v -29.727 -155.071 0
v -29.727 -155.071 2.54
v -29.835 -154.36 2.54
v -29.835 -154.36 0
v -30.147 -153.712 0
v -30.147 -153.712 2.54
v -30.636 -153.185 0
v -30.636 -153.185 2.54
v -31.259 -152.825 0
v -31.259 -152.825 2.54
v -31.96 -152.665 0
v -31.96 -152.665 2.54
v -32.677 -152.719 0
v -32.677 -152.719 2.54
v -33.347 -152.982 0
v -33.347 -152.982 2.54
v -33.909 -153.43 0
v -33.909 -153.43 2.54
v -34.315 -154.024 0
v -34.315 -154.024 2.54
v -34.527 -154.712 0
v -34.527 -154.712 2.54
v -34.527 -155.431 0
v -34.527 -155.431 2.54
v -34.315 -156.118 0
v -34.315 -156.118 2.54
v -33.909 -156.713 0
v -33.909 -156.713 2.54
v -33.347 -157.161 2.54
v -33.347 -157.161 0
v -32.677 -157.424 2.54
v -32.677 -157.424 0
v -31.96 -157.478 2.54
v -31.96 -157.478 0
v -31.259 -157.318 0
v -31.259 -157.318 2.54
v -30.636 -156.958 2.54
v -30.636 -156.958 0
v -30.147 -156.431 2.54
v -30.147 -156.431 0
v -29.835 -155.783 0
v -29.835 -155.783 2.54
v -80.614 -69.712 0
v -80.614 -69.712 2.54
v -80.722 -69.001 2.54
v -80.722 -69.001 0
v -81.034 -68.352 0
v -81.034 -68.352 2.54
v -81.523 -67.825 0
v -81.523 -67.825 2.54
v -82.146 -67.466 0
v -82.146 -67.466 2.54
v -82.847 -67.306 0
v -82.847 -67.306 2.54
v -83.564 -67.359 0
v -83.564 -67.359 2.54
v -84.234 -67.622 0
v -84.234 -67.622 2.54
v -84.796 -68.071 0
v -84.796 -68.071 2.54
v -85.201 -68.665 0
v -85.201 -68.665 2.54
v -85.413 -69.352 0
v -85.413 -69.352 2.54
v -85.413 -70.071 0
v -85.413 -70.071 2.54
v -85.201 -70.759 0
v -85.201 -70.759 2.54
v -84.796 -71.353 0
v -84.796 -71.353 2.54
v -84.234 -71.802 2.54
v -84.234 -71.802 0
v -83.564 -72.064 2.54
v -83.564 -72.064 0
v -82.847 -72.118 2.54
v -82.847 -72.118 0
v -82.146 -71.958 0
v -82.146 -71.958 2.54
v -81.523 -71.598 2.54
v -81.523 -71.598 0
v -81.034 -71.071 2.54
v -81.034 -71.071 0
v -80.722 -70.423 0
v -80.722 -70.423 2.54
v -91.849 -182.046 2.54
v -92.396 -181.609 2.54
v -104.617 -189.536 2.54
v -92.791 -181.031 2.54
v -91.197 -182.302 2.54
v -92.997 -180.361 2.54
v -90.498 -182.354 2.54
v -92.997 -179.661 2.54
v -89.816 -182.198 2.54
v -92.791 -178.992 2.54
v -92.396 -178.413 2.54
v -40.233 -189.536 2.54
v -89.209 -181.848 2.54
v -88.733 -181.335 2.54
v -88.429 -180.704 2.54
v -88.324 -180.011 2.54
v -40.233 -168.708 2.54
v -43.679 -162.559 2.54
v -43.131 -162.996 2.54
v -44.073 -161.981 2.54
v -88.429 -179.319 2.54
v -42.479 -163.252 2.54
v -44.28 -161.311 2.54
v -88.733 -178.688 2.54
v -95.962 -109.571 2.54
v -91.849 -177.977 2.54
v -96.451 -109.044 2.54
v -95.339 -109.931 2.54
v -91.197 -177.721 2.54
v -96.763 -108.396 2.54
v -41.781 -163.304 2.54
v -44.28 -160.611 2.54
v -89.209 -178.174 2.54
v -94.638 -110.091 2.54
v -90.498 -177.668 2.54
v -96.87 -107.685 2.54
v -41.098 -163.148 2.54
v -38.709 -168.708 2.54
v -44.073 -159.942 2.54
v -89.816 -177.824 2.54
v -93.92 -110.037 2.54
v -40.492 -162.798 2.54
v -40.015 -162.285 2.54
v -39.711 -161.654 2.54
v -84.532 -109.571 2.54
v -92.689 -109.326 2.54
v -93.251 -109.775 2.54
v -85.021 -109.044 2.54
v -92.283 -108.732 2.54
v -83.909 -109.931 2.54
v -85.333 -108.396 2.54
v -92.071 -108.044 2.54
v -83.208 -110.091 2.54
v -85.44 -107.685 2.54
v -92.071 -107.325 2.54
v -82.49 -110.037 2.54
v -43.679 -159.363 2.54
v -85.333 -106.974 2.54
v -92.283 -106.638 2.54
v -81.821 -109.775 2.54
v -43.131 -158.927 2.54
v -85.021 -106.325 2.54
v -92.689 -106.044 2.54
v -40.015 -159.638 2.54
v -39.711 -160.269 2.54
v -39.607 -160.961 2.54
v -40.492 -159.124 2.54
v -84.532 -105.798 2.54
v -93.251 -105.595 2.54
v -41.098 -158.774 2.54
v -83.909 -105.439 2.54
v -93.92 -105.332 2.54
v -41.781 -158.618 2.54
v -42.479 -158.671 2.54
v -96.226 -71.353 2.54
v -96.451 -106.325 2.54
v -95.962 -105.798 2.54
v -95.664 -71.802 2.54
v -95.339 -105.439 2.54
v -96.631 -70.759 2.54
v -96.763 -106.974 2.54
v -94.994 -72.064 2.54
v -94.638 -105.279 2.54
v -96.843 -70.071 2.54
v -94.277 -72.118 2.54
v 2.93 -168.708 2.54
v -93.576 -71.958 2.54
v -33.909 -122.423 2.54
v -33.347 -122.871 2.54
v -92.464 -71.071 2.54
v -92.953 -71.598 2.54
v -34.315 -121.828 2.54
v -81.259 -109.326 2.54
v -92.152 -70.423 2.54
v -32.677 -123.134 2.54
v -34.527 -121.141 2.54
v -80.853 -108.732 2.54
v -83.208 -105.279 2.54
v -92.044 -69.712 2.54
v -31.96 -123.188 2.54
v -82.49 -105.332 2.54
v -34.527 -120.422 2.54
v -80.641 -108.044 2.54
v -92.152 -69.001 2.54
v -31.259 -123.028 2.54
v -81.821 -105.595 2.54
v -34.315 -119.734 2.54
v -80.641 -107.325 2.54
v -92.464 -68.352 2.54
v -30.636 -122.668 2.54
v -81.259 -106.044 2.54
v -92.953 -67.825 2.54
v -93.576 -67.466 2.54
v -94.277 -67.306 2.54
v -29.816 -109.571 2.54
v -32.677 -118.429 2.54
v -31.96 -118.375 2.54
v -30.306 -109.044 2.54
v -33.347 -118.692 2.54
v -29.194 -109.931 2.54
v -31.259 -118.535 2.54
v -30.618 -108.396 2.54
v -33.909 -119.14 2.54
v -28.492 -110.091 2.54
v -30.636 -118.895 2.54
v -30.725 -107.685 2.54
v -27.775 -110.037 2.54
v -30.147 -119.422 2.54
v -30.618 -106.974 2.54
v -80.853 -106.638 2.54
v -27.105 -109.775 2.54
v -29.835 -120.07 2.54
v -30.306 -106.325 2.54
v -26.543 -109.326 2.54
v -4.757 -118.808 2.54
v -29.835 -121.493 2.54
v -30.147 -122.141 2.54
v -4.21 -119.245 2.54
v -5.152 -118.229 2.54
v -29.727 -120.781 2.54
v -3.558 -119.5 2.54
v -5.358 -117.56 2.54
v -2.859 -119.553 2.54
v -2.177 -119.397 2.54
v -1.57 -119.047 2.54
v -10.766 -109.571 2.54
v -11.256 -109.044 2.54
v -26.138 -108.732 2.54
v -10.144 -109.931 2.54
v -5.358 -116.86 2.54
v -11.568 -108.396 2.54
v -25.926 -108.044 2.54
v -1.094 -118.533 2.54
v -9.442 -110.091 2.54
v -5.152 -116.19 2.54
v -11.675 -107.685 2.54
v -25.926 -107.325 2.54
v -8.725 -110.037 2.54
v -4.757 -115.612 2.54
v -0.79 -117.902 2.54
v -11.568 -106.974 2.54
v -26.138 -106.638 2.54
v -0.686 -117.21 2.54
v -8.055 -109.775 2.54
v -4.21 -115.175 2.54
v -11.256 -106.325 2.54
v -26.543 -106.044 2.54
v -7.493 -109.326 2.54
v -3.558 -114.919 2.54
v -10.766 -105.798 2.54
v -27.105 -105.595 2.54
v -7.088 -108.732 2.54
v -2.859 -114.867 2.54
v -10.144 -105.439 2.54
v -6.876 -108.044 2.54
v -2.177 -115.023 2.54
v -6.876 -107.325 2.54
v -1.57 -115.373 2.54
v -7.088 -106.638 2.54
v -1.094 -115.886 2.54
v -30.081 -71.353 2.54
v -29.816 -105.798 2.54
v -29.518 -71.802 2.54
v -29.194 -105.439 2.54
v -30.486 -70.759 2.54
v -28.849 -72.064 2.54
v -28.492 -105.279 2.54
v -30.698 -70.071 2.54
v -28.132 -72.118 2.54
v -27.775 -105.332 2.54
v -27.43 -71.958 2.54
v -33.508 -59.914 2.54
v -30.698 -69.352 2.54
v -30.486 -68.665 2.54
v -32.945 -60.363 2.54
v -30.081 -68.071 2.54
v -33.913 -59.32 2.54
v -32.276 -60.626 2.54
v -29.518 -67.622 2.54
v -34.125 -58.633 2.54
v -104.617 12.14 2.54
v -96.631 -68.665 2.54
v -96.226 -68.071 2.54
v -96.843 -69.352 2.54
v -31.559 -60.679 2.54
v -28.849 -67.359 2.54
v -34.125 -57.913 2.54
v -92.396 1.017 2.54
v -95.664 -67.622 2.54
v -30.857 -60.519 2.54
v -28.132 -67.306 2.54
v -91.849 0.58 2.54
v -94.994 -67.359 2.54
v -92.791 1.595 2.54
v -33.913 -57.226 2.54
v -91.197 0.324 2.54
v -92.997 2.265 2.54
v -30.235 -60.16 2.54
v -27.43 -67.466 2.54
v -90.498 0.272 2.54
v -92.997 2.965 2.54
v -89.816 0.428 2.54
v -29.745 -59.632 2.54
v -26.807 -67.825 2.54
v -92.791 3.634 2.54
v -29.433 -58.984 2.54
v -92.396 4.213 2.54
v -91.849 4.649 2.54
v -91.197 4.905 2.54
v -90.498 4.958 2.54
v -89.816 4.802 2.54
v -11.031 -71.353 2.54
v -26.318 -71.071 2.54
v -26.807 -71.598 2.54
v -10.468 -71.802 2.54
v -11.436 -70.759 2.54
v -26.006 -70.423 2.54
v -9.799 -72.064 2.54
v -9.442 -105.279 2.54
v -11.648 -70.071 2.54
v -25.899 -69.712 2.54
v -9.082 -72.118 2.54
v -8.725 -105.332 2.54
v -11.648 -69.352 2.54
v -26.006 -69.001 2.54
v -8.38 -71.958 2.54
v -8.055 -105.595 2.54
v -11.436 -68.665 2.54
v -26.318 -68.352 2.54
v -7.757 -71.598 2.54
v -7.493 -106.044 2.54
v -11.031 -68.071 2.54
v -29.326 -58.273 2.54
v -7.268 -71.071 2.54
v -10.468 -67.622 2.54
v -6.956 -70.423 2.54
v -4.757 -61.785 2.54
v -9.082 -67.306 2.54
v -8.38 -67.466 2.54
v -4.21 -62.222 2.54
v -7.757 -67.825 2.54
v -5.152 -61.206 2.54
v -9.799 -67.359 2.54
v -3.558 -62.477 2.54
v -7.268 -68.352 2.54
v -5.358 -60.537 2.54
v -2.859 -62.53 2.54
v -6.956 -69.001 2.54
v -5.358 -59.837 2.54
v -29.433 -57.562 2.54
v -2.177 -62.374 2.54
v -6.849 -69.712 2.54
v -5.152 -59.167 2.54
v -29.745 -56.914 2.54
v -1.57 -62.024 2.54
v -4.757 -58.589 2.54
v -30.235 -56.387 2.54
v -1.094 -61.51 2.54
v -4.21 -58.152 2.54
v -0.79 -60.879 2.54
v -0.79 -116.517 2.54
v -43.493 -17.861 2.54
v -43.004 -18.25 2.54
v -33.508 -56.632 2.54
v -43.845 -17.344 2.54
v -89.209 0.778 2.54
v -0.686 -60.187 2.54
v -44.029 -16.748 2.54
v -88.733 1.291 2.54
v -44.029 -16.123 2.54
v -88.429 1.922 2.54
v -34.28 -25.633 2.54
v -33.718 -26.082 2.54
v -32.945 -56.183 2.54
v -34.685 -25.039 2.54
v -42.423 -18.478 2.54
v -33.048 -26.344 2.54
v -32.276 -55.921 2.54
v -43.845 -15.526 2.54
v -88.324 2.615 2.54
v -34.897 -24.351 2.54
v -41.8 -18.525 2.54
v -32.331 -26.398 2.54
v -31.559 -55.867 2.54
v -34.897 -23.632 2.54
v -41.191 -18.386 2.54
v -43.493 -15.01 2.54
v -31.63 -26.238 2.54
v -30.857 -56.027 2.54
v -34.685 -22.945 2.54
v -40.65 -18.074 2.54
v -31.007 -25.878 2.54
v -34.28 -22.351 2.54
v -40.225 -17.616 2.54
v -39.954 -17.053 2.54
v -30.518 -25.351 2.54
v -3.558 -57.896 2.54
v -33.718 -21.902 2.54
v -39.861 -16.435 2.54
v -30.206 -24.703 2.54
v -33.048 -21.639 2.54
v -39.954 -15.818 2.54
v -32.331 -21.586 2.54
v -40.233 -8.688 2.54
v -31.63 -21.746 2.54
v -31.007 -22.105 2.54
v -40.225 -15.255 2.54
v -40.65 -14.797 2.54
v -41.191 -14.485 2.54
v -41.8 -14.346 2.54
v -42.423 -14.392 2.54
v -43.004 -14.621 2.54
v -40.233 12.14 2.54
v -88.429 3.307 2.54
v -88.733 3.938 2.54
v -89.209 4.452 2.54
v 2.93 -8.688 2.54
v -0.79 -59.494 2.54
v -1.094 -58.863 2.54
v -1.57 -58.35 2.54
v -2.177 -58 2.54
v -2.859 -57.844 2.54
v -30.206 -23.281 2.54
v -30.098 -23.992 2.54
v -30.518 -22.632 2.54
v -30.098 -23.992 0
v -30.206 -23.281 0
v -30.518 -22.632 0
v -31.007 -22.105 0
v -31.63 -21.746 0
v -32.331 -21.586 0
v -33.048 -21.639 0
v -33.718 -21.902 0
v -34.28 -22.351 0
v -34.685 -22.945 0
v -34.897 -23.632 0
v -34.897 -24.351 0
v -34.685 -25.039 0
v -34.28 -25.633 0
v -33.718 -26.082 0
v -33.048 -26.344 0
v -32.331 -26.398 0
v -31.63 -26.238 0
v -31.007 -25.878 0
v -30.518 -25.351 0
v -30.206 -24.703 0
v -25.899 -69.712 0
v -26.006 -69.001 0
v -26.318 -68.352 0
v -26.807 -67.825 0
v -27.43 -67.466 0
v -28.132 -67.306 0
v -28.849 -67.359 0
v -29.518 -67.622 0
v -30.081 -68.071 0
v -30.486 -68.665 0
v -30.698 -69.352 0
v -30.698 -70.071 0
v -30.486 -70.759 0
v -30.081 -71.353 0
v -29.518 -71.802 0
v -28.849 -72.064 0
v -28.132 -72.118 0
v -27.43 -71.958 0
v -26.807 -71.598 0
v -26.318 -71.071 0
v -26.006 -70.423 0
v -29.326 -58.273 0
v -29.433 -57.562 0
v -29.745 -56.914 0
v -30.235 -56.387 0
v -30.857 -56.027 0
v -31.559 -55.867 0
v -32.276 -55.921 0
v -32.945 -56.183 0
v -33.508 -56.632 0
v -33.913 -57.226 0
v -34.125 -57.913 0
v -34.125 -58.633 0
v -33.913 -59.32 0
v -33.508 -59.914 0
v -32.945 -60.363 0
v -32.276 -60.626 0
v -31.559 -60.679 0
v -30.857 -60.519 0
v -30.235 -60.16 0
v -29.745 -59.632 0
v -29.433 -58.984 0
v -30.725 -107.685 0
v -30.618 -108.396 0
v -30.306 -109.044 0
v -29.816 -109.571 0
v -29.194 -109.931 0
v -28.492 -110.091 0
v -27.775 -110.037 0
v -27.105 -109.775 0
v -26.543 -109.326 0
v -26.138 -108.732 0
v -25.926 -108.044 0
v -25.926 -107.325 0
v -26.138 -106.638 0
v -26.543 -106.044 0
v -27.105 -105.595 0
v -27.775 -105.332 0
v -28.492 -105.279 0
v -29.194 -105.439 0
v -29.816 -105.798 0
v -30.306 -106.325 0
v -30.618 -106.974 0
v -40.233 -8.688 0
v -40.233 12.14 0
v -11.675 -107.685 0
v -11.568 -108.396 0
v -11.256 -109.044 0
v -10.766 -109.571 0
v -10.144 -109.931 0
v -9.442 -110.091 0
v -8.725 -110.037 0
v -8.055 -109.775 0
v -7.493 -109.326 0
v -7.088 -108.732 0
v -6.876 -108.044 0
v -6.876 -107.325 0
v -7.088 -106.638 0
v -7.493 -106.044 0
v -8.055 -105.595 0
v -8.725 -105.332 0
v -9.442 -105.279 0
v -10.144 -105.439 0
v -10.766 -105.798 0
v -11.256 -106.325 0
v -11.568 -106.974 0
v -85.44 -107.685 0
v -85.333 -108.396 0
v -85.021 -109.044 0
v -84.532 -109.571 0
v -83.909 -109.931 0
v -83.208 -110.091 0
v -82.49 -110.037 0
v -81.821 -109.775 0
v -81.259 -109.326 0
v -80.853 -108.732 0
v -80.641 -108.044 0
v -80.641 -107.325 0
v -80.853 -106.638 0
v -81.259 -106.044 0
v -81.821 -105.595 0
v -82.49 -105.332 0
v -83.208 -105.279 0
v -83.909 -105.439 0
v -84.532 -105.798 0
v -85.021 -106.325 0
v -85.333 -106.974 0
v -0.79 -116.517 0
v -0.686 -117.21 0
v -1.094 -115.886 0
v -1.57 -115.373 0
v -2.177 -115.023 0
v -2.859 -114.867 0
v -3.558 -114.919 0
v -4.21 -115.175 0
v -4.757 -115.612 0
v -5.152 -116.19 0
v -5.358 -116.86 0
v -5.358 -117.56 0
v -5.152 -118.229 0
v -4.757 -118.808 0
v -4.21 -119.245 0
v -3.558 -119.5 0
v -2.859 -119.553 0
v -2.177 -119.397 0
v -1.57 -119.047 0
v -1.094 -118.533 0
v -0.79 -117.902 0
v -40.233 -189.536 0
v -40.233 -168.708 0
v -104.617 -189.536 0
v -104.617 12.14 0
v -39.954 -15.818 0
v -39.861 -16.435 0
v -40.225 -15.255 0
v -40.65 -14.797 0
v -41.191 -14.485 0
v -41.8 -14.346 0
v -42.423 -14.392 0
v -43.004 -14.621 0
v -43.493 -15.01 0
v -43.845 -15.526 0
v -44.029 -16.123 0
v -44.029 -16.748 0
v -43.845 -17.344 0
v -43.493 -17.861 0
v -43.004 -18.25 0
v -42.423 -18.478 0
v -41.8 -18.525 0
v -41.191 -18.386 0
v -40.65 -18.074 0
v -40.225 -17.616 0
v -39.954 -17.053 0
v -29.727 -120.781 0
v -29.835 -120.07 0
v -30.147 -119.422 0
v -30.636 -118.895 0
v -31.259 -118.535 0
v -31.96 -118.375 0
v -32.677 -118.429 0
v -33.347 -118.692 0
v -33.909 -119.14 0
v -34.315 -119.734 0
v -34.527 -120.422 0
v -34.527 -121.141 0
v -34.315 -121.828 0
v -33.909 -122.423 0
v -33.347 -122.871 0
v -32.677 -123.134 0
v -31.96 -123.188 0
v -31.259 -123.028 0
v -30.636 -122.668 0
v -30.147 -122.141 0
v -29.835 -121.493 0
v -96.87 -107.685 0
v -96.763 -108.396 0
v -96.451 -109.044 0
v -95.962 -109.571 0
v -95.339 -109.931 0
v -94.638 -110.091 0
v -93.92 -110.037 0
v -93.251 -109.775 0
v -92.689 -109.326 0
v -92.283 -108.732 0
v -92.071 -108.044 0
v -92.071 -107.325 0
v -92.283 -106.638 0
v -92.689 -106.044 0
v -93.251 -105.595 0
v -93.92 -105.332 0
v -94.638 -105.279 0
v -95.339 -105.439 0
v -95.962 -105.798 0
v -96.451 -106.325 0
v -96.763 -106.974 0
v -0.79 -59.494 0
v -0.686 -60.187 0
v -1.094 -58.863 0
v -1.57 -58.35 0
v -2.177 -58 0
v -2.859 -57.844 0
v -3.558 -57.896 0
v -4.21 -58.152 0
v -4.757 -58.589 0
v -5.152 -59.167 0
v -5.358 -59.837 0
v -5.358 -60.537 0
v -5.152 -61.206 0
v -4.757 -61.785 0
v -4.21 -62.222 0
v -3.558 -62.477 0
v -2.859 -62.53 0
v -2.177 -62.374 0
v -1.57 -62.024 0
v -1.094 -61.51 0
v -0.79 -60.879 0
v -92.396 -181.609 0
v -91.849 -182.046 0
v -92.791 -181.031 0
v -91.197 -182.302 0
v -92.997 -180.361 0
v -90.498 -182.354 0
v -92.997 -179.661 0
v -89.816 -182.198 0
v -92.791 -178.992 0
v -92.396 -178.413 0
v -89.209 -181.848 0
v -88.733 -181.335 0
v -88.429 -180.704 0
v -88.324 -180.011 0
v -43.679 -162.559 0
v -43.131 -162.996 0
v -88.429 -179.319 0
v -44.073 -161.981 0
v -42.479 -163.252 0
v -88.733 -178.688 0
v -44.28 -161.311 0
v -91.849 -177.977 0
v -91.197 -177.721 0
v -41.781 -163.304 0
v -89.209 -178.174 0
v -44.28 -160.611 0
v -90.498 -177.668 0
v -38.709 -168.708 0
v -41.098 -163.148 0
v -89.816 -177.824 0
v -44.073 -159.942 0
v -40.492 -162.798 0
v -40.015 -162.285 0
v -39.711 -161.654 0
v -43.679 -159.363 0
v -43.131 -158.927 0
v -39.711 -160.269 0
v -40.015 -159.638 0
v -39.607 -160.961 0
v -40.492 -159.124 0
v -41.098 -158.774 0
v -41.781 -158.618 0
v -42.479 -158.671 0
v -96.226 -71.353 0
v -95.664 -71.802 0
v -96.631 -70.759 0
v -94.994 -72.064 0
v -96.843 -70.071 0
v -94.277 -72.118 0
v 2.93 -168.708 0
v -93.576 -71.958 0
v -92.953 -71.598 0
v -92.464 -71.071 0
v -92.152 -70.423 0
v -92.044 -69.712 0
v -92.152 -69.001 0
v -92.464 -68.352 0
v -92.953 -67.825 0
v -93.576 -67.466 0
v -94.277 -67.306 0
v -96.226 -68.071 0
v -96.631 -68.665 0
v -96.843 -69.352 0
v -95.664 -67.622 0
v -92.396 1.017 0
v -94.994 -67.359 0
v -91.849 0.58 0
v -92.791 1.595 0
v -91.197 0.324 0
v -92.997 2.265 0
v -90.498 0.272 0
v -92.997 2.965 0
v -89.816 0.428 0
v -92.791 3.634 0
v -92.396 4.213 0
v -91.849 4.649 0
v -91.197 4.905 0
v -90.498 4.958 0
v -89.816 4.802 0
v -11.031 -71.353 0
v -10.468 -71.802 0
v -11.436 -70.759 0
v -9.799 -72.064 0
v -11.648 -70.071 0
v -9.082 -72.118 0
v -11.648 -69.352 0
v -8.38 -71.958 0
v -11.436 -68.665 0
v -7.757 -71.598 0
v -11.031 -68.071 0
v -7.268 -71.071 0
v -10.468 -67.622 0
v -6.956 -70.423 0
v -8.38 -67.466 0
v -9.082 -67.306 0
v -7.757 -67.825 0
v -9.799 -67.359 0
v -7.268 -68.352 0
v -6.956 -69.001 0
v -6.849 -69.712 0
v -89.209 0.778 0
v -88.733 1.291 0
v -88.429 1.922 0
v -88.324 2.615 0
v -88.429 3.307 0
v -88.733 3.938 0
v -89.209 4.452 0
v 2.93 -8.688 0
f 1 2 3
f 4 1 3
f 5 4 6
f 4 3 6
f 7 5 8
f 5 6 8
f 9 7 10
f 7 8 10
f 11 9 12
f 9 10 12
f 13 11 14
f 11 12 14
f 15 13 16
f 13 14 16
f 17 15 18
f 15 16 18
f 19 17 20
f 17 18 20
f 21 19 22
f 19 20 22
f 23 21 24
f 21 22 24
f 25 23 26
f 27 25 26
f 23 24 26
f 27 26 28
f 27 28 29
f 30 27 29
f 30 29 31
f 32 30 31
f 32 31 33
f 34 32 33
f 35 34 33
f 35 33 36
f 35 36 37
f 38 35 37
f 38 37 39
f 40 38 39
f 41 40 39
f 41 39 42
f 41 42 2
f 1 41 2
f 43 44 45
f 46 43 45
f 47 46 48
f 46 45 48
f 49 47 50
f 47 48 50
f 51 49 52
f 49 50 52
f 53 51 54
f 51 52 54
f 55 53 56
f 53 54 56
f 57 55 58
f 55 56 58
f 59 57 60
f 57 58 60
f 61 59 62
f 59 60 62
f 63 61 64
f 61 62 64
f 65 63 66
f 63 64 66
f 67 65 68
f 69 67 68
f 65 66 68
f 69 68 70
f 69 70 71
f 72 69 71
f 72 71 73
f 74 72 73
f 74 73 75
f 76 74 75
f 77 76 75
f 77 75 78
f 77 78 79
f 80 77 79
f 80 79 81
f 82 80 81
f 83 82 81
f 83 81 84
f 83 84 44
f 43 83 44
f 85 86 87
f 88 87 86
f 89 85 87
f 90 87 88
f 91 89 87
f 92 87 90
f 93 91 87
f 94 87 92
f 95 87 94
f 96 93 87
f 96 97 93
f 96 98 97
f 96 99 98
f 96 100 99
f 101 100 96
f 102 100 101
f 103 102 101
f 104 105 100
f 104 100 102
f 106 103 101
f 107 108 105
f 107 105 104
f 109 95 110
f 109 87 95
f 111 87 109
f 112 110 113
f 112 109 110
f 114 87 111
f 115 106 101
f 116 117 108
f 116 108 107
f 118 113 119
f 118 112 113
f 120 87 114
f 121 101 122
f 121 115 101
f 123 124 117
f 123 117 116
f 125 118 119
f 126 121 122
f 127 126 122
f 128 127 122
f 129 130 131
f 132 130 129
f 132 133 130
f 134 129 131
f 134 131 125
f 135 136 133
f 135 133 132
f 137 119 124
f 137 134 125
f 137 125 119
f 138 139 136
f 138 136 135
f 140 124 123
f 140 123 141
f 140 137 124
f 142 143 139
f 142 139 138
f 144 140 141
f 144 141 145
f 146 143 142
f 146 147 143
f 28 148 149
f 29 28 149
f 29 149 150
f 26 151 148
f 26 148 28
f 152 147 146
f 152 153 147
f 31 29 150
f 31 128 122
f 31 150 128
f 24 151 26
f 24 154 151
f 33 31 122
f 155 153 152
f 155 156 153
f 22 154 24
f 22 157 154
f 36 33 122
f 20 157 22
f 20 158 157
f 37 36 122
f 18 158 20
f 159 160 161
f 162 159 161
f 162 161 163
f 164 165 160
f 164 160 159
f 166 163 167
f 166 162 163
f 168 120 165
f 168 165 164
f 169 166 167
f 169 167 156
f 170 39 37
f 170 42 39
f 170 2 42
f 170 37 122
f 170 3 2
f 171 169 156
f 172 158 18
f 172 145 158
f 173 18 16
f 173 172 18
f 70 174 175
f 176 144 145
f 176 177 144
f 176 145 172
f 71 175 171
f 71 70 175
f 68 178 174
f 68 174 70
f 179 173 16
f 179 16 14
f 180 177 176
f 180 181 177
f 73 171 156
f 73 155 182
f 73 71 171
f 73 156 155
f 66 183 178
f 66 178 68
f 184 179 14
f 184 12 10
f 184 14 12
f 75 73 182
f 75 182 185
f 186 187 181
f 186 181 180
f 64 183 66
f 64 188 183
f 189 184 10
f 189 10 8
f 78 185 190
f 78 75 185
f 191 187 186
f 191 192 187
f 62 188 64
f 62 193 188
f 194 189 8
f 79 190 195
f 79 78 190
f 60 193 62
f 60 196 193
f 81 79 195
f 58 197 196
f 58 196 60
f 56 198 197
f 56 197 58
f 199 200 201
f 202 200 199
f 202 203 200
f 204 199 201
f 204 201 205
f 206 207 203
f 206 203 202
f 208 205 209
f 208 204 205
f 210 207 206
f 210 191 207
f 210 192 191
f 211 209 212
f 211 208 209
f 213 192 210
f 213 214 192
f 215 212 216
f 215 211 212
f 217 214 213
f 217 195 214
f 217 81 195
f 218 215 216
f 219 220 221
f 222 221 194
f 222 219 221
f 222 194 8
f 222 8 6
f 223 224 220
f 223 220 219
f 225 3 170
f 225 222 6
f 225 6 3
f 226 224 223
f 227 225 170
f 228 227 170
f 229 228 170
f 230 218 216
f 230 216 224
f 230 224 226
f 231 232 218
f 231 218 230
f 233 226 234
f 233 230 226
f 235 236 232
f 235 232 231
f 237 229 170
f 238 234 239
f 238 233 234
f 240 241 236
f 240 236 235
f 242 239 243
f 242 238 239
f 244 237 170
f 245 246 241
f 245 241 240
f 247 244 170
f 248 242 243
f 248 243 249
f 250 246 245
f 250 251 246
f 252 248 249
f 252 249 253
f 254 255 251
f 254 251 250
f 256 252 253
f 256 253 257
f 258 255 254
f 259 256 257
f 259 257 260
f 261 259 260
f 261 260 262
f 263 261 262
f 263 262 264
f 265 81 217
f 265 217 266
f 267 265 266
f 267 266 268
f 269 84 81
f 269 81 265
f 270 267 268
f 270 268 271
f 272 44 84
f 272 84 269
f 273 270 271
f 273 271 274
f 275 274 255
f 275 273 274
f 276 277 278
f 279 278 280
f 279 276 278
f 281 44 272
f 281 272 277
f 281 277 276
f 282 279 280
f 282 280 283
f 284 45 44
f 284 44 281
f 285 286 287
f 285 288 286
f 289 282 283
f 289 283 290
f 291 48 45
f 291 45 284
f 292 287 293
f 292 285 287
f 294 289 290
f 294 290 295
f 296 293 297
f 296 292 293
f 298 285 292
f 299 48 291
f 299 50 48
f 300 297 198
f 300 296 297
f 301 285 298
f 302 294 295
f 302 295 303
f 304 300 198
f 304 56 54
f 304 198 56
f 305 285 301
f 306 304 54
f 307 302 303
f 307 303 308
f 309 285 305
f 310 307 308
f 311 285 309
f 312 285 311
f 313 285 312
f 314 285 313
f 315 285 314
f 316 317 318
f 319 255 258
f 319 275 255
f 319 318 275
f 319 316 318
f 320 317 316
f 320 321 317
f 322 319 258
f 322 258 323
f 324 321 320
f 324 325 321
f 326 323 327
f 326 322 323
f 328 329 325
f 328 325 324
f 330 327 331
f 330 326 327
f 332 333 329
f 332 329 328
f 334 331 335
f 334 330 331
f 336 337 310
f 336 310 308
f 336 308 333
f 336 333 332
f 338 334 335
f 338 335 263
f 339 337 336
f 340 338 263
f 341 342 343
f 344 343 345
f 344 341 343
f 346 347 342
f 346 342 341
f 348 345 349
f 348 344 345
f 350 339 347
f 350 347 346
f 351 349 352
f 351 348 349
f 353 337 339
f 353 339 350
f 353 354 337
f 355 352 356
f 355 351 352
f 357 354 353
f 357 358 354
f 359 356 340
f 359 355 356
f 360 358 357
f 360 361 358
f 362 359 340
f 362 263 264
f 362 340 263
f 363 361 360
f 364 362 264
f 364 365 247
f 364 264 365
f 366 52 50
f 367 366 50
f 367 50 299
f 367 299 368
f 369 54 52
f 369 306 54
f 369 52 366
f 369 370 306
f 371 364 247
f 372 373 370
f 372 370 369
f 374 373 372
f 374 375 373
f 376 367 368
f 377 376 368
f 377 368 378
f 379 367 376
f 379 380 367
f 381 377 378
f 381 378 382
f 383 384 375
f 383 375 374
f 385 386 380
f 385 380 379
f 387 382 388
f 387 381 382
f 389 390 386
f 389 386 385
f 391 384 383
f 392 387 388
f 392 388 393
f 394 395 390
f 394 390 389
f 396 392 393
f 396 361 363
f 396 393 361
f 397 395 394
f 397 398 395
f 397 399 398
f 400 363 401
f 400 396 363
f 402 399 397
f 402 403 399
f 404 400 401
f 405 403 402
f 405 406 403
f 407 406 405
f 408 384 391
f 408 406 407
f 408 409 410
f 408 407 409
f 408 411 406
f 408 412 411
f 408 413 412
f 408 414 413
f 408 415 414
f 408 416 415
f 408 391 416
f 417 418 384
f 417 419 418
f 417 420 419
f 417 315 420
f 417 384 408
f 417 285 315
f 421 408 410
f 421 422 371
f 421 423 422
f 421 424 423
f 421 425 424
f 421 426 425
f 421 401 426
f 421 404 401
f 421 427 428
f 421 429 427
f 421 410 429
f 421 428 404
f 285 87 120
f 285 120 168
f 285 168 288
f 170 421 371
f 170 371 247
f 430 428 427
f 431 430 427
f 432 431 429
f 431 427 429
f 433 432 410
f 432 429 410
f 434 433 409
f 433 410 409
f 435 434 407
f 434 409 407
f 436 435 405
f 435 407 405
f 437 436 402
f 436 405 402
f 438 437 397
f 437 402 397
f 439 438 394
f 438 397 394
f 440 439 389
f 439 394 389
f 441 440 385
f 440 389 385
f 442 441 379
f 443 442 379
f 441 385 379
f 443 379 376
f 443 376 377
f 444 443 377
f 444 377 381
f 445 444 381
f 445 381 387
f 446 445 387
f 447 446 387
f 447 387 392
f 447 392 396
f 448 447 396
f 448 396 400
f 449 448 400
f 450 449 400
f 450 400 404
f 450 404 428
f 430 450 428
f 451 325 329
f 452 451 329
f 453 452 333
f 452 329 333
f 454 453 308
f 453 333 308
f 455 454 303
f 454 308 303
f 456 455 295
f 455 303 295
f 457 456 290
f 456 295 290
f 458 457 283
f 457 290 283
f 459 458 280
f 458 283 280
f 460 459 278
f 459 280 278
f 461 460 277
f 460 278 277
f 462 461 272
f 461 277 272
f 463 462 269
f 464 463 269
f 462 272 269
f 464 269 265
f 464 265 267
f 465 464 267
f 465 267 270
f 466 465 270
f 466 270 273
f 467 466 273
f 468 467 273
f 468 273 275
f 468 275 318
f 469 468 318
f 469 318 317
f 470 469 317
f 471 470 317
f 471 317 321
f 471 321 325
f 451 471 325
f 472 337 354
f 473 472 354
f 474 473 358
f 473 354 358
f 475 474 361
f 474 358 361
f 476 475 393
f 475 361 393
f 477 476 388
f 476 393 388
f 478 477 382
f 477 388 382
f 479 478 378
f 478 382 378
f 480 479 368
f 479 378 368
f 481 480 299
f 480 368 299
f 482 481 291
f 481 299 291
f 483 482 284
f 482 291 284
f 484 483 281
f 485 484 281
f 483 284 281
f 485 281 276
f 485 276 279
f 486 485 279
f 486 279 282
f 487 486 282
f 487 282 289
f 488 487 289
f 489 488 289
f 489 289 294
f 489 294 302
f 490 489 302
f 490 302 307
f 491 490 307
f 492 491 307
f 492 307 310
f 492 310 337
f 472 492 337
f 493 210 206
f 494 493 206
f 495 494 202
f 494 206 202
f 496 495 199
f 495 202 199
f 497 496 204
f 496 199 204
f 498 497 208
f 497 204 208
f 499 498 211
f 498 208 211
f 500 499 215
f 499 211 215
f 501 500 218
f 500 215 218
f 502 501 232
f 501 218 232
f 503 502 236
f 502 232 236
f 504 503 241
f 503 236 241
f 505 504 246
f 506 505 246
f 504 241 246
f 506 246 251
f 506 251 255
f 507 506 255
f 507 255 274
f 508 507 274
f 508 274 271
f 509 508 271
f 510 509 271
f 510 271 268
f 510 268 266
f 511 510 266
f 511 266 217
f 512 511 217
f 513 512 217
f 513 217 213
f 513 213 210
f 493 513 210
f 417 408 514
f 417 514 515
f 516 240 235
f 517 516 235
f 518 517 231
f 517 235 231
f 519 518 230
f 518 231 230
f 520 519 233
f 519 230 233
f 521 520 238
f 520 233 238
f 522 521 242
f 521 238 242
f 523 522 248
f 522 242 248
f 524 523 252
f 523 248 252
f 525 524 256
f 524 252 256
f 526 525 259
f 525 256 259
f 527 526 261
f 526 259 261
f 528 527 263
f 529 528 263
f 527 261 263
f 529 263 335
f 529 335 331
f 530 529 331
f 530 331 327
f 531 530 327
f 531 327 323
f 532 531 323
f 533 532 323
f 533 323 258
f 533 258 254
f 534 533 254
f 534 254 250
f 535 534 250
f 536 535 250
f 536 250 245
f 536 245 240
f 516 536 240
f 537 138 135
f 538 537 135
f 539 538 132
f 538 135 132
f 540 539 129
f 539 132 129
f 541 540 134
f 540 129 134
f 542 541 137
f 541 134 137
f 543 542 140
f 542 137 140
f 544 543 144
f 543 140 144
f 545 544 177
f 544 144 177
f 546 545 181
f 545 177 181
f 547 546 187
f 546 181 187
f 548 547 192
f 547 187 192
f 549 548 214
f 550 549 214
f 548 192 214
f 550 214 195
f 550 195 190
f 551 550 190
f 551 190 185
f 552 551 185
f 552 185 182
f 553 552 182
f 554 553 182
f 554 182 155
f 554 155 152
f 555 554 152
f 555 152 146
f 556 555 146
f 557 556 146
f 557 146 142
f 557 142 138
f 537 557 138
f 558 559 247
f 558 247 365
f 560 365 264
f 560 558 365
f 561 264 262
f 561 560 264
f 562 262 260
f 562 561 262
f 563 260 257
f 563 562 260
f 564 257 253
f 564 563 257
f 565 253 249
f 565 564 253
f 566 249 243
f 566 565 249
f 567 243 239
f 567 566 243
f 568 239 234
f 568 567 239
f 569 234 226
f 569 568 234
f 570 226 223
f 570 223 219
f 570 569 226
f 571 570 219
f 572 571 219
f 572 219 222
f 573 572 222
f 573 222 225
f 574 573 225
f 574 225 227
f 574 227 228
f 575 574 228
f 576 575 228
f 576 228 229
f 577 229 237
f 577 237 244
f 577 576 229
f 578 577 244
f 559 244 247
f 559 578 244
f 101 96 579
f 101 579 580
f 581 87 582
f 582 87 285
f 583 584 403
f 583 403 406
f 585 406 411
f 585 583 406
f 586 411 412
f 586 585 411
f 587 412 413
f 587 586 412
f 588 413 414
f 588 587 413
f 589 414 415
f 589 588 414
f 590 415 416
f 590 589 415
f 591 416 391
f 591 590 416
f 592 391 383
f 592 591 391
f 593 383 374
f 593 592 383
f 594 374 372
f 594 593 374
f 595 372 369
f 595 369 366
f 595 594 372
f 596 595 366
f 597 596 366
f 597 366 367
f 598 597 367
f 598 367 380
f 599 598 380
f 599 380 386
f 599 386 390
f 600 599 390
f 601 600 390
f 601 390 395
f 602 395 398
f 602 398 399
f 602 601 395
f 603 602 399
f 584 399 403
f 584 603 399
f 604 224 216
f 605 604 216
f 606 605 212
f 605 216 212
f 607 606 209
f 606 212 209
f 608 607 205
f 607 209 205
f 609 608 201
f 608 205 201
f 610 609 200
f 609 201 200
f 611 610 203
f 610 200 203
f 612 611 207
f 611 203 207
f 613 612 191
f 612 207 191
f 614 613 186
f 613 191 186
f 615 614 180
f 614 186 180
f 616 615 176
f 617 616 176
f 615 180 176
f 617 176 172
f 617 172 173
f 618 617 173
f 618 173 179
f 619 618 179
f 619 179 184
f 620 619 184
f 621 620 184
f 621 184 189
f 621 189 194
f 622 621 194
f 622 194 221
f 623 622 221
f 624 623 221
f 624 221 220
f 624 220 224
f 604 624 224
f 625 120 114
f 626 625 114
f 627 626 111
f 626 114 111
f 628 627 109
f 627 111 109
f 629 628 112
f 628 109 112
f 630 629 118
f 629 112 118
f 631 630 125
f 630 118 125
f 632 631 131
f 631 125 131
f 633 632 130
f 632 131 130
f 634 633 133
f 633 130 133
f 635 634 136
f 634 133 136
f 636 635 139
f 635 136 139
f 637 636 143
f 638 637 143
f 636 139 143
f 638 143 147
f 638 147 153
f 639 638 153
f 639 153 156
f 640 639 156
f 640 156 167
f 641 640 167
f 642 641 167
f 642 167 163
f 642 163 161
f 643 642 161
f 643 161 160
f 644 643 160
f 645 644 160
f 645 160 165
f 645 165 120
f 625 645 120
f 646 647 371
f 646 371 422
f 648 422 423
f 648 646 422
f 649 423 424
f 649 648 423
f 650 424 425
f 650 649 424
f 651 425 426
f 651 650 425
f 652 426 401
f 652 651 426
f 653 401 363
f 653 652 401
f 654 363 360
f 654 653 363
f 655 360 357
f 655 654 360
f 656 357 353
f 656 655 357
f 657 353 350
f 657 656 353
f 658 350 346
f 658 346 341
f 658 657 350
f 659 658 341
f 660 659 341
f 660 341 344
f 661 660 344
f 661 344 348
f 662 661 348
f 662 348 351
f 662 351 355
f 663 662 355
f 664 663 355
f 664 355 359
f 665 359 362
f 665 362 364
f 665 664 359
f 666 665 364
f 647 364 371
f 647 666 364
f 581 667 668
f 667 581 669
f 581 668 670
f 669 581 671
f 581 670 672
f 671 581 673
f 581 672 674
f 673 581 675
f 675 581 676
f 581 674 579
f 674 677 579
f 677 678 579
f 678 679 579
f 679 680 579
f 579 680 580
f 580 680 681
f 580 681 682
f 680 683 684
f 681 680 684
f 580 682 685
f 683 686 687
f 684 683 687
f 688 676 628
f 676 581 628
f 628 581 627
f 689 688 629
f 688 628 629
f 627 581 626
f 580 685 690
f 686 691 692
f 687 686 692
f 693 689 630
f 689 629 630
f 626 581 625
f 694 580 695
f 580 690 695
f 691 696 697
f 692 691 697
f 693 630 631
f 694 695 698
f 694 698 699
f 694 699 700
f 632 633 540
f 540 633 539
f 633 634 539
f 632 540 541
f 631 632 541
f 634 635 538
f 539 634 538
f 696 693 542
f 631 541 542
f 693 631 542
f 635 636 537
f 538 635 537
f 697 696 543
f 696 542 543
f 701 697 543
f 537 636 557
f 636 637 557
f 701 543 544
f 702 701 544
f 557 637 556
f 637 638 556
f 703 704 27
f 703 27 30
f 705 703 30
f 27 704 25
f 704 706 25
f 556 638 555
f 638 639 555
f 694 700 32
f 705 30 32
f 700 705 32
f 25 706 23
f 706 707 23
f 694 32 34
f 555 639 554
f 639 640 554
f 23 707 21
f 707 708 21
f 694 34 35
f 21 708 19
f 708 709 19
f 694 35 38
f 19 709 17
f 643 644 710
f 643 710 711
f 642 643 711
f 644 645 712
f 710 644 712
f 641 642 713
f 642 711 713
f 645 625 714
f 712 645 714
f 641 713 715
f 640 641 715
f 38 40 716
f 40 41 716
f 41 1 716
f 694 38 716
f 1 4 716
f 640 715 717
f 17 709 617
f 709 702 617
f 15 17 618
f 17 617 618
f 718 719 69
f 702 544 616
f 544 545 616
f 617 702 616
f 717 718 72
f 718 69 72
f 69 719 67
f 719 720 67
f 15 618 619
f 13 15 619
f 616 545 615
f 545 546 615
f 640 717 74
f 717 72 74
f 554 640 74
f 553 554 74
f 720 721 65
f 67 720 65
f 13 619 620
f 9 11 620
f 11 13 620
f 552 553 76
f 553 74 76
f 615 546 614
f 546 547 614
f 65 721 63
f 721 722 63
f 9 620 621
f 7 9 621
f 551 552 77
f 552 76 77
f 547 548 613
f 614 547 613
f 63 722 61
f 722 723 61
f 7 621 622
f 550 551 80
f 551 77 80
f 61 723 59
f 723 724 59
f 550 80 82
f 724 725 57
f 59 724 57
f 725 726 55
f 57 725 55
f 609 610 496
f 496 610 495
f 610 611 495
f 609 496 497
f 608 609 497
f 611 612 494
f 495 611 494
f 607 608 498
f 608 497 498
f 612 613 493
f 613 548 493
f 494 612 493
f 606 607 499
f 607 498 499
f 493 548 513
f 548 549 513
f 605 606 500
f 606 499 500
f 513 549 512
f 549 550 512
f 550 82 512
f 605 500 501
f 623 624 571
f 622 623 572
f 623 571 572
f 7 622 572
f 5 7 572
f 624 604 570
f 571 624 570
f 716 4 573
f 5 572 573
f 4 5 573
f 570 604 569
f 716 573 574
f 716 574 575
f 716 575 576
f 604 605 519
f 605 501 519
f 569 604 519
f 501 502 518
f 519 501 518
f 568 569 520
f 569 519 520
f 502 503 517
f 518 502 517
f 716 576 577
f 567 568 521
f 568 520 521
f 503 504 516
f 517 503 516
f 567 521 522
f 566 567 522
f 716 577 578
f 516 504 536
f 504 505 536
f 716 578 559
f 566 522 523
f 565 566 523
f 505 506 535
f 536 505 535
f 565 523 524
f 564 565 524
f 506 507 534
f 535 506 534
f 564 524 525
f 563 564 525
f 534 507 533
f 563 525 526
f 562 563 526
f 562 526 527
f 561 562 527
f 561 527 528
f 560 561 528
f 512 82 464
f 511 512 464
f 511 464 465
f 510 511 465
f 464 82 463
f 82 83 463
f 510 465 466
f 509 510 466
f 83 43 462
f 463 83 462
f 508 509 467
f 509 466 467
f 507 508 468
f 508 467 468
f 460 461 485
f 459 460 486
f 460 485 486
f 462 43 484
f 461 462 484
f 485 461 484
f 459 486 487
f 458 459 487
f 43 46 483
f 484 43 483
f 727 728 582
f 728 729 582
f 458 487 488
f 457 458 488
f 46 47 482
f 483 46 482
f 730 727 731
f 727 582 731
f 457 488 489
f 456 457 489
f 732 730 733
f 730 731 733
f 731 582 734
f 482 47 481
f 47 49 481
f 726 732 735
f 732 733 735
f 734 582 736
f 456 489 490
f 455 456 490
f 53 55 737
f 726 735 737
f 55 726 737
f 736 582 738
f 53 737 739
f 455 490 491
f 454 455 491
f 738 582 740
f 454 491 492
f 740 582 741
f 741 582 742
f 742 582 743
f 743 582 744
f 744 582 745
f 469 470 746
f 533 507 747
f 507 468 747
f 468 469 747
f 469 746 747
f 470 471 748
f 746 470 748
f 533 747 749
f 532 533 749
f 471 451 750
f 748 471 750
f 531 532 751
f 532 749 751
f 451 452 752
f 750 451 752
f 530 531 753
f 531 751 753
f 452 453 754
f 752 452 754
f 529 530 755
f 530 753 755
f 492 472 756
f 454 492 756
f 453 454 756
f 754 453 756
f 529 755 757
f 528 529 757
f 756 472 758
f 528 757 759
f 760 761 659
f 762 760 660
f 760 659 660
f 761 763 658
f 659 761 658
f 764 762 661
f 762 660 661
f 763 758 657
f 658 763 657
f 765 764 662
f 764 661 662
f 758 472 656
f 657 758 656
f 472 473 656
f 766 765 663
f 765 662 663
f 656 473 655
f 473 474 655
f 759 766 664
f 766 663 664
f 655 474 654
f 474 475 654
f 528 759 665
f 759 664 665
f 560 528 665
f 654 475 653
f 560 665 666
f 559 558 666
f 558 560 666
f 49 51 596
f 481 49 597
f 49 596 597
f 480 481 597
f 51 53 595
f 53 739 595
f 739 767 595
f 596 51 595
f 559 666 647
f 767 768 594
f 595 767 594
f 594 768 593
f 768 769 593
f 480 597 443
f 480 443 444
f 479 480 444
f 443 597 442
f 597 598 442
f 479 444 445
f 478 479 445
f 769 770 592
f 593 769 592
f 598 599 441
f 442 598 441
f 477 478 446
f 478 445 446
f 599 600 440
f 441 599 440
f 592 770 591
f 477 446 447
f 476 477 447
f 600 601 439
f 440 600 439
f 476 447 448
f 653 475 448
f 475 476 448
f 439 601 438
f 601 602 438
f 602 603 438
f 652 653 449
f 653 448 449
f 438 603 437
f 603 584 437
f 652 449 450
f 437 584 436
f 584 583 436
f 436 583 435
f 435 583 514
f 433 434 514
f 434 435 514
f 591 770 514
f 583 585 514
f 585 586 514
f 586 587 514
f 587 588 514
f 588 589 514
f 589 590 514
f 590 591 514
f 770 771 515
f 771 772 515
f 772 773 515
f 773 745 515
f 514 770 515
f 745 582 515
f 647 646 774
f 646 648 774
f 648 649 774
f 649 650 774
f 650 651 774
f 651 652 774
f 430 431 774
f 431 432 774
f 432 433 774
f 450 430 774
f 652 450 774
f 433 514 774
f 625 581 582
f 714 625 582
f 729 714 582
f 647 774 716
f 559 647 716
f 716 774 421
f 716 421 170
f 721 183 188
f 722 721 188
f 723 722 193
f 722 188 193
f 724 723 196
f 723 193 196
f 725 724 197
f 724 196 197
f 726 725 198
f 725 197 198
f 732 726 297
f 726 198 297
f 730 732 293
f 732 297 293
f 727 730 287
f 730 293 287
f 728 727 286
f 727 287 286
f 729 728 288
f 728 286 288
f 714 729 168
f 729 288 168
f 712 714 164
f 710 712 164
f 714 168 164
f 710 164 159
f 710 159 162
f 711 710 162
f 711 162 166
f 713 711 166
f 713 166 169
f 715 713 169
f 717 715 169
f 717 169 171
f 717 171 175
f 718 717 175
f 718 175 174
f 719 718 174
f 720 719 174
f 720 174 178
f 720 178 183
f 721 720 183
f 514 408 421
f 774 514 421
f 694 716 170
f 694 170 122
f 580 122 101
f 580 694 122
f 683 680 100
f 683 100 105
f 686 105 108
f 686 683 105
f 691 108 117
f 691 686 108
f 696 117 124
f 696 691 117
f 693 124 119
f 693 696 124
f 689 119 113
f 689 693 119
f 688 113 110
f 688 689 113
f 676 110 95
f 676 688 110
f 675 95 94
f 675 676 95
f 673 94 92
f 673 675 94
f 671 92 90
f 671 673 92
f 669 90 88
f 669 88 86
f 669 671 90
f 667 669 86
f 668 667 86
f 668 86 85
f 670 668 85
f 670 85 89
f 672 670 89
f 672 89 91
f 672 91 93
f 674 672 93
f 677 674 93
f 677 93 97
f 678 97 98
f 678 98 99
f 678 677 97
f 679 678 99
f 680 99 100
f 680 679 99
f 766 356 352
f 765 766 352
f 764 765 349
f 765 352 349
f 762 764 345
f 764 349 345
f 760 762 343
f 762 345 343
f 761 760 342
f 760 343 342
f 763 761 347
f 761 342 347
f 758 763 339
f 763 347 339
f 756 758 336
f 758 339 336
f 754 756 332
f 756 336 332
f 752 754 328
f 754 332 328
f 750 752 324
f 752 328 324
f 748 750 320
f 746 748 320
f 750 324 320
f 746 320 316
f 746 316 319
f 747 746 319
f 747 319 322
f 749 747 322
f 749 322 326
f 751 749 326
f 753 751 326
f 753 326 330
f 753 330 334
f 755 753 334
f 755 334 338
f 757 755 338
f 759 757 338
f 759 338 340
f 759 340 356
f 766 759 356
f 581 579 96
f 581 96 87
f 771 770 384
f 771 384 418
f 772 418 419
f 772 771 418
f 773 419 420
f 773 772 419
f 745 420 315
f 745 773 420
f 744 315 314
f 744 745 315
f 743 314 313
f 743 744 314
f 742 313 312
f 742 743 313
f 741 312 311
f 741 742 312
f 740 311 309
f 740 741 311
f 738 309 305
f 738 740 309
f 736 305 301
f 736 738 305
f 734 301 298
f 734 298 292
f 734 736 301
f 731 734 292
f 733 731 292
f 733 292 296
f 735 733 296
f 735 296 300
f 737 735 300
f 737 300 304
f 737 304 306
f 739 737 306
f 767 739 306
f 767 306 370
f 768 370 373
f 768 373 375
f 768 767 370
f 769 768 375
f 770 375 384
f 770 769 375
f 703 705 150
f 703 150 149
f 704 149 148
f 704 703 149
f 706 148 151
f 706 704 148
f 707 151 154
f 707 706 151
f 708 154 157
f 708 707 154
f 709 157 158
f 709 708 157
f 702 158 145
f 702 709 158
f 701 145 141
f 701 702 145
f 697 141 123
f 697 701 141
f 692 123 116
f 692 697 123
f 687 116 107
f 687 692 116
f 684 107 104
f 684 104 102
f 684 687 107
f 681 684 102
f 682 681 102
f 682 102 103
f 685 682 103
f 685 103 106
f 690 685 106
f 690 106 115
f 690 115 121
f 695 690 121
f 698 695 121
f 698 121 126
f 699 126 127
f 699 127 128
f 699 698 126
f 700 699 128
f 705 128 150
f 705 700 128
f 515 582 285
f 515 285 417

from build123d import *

# Parameters (mm, degrees)
SKETCH2_R               = 2.3495
SKETCH2_R_2             = 2.0955
BOSS_EXTRUDE1_DEPTH     = 2.54
SKETCH3_W               = 31.75
SKETCH3_H               = 44.323
BOSS_EXTRUDE2_DEPTH     = 2.54
SKETCH4_R               = 2.413
CUT_EXTRUDE1_DEPTH      = 238.743265275
SKETCH5_R               = 2.413
CUT_EXTRUDE2_DEPTH      = 238.743265275
SKETCH6_R               = 2.413
CUT_EXTRUDE3_DEPTH      = 238.743265275
SKETCH7_R               = 2.413
CUT_EXTRUDE4_DEPTH      = 238.743265275
SKETCH8_W               = 7.994763
SKETCH8_H               = 21.113506736
SKETCH8_W_2             = 21.493659396
SKETCH8_H_2             = 28.960940125
CUT_EXTRUDE5_DEPTH      = 238.743265275
CUT_EXTRUDE6_DEPTH      = 238.743265275
CUT_EXTRUDE6_DEPTH_BACK = 238.743265275


with BuildPart() as part:
    # Sketch2 → Boss-Extrude1 (new body)
    with BuildSketch(Plane(origin=(0, 0, 0), x_dir=(-1, 0, 0), z_dir=(0, 0, 1))):
        Polygon((-2.930050059, 168.708281075), (38.709428475, 168.708281075), (38.709428475, 189.536281075), (143.497061781, 189.536281075), (104.617436481, 110.859781075), (72.867436481, 110.859781075), (72.867436481, 66.536781075), (104.617436481, 66.536781075), (143.497061781, -12.139718925), (38.709428475, -12.139718925), (38.709428475, 8.688281075), (-2.930050059, 8.688281075), align=None)
        with Locations(Location((41.95655448, 160.961281075, 0), (0, 0, 180))):
            Circle(SKETCH2_R, mode=Mode.SUBTRACT)
        with Locations(Location((90.673911143, 180.011281075, 0), (0, 0, 180))):
            Circle(SKETCH2_R, mode=Mode.SUBTRACT)
        with Locations(Location((90.673911143, -2.614718925, 0), (0, 0, 180))):
            Circle(SKETCH2_R, mode=Mode.SUBTRACT)
        with Locations(Location((3.035061781, 117.209781075, 0), (0, 0, 180))):
            Circle(SKETCH2_R, mode=Mode.SUBTRACT)
        with Locations(Location((3.035061781, 60.186781075, 0), (0, 0, 180))):
            Circle(SKETCH2_R, mode=Mode.SUBTRACT)
        with Locations(Location((41.95655448, 16.435281075, 0), (0, 0, 180))):
            Circle(SKETCH2_R_2, mode=Mode.SUBTRACT)
    extrude(amount=BOSS_EXTRUDE1_DEPTH)

    # Sketch3 → Boss-Extrude2 (add)
    with BuildSketch(Plane.XY.offset(2.54)):
        with Locations((-88.742436481, -88.698281075)):
            Rectangle(SKETCH3_W, SKETCH3_H)
    extrude(amount=-BOSS_EXTRUDE2_DEPTH)

    # Sketch4 → Cut-Extrude1 (cut, through all)
    with BuildSketch(Plane.XY.offset(2.54)):
        with Locations((-94.457436481, -69.711781075)):
            Circle(SKETCH4_R)
        with Locations((-83.027436481, -69.711781075)):
            Circle(SKETCH4_R)
        with Locations((-28.311949941, -69.711781075)):
            Circle(SKETCH4_R)
        with Locations((-9.261949941, -69.711781075)):
            Circle(SKETCH4_R)
        with Locations(Location((-9.261949941, -107.684781075, 0), (0, 0, 180))):
            Circle(SKETCH4_R)
        with Locations(Location((-28.311949941, -107.684781075, 0), (0, 0, 180))):
            Circle(SKETCH4_R)
        with Locations(Location((-83.027436481, -107.684781075, 0), (0, 0, 180))):
            Circle(SKETCH4_R)
        with Locations(Location((-94.457436481, -107.684781075, 0), (0, 0, 180))):
            Circle(SKETCH4_R)
    extrude(amount=-CUT_EXTRUDE1_DEPTH, mode=Mode.SUBTRACT)

    # Sketch5 → Cut-Extrude2 (cut, through all)
    with BuildSketch(Plane.XY.offset(2.54)):
        with Locations((-31.738991634, -58.273080522)):
            Circle(SKETCH5_R)
    extrude(amount=-CUT_EXTRUDE2_DEPTH, mode=Mode.SUBTRACT)

    # Sketch6 → Cut-Extrude3 (cut, through all)
    with BuildSketch(Plane.XY.offset(2.54)):
        with Locations((-32.511395831, -23.991781075)):
            Circle(SKETCH6_R)
    extrude(amount=-CUT_EXTRUDE3_DEPTH, mode=Mode.SUBTRACT)

    # Sketch7 → Cut-Extrude4 (cut, through all)
    with BuildSketch(Plane.XY.offset(2.54)):
        with Locations((-32.140467993, -155.071444629)):
            Circle(SKETCH7_R)
        with Locations((-32.140467993, -120.781444629)):
            Circle(SKETCH7_R)
    extrude(amount=-CUT_EXTRUDE4_DEPTH, mode=Mode.SUBTRACT)

    # Sketch8 → Cut-Extrude5 (cut, through all)
    with BuildSketch(Plane.XY.offset(2.54)):
        with Locations((-36.236046975, 1.868472293)):
            Rectangle(SKETCH8_W, SKETCH8_H)
        with Locations((-29.486598777, -183.188751137)):
            Rectangle(SKETCH8_W_2, SKETCH8_H_2)
    extrude(amount=-CUT_EXTRUDE5_DEPTH, mode=Mode.SUBTRACT)

    # Sketch9 → Cut-Extrude6 (cut, two sides: drawn at the far end of the back side and taken through both)
    with BuildSketch(Plane.XY.offset(2.54).offset(-CUT_EXTRUDE6_DEPTH_BACK)):
        Polygon((-104.617436481, -66.536781075), (-104.617436481, 15.636566552), (-183.179161499, 15.636566552), (-188.262141255, -199.721259961), (-104.617436481, -202.664037714), align=None)
    extrude(amount=CUT_EXTRUDE6_DEPTH + CUT_EXTRUDE6_DEPTH_BACK, mode=Mode.SUBTRACT)


solid = part.part
